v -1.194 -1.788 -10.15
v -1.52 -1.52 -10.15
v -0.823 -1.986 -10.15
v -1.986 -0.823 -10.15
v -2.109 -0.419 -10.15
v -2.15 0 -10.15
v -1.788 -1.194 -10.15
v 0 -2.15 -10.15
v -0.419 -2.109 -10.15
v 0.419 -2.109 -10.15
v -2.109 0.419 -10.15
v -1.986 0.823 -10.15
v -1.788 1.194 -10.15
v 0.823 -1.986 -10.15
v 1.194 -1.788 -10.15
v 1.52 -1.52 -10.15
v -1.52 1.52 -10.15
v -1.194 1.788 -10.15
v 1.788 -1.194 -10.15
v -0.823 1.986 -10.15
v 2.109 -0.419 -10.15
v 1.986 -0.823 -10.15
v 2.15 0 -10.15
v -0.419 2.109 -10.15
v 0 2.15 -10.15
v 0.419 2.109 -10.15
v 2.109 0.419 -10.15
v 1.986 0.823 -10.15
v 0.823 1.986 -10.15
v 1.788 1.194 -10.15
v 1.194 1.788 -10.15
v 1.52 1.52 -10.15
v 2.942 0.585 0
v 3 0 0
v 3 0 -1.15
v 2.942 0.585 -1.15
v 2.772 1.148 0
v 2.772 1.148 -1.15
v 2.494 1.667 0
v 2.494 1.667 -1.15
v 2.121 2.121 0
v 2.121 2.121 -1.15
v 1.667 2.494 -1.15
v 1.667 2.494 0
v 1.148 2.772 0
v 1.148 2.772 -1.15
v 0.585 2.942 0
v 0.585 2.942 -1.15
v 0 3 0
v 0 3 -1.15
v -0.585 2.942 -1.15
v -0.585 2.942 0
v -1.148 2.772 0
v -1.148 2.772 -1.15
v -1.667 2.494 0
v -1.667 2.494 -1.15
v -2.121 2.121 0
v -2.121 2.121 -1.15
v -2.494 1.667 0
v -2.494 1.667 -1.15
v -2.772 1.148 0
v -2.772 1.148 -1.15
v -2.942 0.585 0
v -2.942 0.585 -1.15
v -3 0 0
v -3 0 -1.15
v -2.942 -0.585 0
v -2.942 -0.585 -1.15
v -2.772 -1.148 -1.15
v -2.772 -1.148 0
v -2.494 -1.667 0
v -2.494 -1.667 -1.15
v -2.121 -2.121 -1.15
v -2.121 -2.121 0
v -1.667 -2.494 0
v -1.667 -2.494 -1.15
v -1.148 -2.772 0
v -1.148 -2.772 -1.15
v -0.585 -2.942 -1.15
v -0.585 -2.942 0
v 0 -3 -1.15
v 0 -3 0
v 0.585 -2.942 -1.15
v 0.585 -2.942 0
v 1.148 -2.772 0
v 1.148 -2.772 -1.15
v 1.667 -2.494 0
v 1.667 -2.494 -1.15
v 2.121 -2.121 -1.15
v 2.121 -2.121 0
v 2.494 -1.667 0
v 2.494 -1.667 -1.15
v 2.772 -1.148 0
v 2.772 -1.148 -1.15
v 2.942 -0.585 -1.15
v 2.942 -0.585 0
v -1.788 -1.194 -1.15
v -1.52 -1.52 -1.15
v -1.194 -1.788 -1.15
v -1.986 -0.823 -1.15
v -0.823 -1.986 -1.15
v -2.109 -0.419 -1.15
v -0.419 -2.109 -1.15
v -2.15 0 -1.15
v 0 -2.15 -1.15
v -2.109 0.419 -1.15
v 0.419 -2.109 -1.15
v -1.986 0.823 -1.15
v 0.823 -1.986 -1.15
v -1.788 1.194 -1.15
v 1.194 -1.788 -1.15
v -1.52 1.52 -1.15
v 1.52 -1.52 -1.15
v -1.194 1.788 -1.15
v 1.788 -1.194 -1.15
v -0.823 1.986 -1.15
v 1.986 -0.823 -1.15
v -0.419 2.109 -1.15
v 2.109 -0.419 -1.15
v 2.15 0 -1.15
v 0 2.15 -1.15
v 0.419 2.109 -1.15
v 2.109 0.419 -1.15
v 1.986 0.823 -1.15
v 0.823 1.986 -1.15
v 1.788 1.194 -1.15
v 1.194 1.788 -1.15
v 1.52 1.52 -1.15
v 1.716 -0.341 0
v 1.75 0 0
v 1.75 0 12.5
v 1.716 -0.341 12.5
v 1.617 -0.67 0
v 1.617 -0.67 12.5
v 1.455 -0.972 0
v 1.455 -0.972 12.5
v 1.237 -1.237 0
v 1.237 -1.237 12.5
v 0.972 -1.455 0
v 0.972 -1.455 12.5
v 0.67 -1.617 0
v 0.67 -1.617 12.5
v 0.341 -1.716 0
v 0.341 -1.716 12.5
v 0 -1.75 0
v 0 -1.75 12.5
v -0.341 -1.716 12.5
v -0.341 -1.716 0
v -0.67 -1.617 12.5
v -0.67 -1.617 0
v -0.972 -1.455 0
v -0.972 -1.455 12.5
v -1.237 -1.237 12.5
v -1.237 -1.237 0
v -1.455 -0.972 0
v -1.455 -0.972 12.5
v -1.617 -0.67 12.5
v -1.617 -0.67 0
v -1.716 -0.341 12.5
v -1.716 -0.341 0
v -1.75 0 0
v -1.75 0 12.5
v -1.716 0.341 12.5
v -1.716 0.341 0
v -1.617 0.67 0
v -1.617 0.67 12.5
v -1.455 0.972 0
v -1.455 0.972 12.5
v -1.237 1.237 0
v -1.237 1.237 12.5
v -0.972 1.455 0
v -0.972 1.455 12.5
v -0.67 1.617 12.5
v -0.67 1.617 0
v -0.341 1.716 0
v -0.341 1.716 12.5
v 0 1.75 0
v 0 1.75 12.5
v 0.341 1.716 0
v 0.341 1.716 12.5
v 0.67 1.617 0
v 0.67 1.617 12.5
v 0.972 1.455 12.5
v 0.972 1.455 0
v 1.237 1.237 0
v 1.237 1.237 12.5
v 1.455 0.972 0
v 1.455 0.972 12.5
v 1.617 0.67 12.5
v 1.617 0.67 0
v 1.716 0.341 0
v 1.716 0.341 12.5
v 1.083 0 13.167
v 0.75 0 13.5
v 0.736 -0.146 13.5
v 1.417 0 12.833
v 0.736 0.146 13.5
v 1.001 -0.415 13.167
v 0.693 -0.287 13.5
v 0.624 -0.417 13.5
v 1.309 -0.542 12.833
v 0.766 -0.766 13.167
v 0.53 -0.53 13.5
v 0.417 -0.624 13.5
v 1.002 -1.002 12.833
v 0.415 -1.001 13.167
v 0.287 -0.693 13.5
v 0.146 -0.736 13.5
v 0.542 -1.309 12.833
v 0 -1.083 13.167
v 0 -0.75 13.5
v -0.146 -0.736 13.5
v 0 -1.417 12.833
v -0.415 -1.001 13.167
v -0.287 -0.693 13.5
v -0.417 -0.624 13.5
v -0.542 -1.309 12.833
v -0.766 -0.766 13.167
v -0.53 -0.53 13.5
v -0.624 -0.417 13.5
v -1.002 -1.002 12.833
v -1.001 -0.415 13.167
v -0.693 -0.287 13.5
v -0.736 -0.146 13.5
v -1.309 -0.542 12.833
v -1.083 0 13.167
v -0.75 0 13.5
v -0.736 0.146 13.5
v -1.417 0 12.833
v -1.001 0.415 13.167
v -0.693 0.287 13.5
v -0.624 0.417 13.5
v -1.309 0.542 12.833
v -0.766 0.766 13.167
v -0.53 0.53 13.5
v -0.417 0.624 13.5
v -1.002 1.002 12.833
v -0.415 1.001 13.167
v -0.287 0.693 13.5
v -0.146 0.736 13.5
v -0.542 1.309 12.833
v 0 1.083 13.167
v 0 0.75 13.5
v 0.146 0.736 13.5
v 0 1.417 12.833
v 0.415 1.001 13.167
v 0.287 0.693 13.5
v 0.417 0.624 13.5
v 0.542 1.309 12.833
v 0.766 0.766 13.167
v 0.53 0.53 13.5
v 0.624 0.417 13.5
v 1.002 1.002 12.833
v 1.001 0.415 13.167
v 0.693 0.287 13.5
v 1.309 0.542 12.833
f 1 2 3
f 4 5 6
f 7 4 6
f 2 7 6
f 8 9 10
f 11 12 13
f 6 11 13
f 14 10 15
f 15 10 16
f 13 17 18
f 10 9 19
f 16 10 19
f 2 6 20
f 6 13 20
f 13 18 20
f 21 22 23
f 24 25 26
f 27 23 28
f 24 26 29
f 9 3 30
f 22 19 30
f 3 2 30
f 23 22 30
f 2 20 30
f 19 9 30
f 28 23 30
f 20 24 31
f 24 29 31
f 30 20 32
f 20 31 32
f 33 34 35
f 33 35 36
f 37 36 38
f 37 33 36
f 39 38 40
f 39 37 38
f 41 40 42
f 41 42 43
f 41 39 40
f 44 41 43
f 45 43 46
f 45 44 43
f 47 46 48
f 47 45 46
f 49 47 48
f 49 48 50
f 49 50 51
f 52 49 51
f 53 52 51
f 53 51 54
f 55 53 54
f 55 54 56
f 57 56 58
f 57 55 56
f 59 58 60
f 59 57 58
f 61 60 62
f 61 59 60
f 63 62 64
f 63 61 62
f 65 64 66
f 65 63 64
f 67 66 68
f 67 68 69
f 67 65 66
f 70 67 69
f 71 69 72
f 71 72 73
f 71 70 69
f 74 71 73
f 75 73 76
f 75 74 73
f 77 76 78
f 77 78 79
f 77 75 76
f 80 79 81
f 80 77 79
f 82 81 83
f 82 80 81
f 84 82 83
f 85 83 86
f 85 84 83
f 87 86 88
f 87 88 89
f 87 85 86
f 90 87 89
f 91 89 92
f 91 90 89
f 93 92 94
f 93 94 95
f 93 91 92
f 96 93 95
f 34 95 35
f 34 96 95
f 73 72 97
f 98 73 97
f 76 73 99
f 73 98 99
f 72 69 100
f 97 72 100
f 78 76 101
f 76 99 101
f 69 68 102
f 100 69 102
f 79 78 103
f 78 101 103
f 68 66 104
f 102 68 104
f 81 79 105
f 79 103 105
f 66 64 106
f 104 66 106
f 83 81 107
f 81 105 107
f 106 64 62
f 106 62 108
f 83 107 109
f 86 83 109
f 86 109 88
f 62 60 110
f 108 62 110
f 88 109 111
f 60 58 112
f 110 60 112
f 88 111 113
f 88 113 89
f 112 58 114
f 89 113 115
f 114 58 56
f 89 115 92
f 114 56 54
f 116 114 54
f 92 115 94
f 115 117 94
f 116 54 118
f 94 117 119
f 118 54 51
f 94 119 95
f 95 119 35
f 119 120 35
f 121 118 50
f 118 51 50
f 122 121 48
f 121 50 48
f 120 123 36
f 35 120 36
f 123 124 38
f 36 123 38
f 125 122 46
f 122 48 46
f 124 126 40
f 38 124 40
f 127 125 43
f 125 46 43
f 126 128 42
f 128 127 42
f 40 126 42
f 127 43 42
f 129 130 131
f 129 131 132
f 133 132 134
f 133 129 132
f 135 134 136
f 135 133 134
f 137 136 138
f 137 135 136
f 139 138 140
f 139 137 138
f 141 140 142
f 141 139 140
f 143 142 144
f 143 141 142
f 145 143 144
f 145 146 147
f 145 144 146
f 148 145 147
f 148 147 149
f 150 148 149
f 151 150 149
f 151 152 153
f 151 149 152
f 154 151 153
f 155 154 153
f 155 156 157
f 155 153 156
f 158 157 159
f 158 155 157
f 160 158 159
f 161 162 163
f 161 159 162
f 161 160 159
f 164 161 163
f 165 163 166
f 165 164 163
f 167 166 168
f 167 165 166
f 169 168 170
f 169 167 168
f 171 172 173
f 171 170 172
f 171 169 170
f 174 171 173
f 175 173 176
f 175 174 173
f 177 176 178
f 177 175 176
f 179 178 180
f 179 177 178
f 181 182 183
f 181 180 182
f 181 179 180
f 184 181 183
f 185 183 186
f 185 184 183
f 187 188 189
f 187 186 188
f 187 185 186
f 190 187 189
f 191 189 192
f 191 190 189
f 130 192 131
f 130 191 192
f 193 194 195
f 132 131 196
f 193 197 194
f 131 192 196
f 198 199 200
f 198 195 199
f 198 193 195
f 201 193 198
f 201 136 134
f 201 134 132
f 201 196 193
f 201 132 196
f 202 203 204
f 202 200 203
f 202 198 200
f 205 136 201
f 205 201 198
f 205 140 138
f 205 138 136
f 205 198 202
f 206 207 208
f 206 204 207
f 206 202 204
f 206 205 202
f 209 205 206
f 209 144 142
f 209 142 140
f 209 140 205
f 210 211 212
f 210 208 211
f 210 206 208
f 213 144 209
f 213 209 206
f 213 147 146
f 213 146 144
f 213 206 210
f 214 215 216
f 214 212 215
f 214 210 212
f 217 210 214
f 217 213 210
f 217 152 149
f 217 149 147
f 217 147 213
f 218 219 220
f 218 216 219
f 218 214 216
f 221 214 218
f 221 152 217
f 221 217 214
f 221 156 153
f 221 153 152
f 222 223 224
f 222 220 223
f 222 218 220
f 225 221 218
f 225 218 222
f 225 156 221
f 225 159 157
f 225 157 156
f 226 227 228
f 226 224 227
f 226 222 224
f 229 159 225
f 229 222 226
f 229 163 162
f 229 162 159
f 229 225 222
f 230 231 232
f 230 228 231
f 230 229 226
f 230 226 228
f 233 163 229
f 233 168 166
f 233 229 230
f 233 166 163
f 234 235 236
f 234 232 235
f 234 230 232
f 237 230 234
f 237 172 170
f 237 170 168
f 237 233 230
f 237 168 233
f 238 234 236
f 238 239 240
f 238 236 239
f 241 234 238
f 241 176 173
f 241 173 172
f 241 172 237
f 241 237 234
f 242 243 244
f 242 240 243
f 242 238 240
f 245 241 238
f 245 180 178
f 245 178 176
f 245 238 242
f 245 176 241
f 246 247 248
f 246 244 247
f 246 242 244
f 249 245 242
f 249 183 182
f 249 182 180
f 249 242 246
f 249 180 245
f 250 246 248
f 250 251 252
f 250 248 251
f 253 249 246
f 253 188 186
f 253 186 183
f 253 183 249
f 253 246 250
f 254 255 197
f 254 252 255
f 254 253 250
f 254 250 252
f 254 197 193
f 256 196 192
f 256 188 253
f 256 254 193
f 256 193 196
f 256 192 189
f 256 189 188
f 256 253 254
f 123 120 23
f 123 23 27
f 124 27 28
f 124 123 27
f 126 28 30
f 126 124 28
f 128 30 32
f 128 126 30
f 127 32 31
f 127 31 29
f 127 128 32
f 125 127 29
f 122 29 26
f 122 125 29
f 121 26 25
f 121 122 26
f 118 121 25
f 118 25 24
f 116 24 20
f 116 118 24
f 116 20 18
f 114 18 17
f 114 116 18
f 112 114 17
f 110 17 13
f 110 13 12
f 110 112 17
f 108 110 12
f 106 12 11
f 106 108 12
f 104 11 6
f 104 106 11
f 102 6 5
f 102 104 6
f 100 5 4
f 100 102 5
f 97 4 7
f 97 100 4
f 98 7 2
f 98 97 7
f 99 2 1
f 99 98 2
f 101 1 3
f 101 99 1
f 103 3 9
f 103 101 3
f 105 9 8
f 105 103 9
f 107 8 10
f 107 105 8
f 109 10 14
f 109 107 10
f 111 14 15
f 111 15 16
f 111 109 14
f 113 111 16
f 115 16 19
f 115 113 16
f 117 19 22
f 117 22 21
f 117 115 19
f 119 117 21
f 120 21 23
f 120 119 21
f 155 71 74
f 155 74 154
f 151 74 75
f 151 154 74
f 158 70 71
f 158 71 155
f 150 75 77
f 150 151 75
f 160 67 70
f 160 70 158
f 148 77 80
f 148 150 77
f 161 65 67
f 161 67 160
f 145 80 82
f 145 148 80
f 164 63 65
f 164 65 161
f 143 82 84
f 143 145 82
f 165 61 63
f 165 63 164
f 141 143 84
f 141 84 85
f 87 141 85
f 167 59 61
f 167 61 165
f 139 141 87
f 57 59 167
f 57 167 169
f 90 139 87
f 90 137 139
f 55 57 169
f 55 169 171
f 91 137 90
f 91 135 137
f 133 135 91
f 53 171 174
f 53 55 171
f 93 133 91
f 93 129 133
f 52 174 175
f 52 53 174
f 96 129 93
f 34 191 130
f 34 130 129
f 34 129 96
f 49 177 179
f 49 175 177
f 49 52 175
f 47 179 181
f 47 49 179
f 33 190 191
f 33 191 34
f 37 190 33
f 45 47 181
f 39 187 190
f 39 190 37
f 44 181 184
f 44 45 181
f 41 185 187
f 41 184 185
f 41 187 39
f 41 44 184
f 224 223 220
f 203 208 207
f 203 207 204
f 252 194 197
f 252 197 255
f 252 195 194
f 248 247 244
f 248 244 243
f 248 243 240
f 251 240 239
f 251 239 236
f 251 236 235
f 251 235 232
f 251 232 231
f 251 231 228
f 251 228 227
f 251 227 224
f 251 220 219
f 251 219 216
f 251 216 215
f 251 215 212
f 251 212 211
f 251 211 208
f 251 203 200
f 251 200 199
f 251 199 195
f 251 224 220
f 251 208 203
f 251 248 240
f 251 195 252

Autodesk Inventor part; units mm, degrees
ref_plane "YZ Plane" through (0, 0, 0) normal (1, 0, 0) x (0, 1, 0)
ref_plane "XZ Plane" through (0, 0, 0) normal (0, 1, 0) x (-1, 0, 0)
ref_plane "XY Plane" through (0, 0, 0) normal (0, 0, 1) x (1, 0, 0)
sketch "스케치1" plane through (0, 0, 0) normal (0, 0, 1) x (1, 0, 0)
  circle A0 centre (0, 0) radius 1.75
  circle A1 centre (0, 0) radius 3
  circle A2 centre (0, 0) radius 2.15
  dimension "d0" = 3.5
  dimension "d1" = 6
  dimension "d2" = 4.3
extrude "돌출1" add sketch "스케치1" along normal blind 13.5 contours A0
extrude "돌출2" add sketch "스케치1" against normal blind 1.15 contours A0 | A1 | A2
extrude "돌출3" add sketch "스케치1" against normal blind 10.15 contours A0 | A2
chamfer "모따기1" distance 1 angle 45 1 edges at (-1.75, 0, 13.5)
properties part number "Audio_jac"
